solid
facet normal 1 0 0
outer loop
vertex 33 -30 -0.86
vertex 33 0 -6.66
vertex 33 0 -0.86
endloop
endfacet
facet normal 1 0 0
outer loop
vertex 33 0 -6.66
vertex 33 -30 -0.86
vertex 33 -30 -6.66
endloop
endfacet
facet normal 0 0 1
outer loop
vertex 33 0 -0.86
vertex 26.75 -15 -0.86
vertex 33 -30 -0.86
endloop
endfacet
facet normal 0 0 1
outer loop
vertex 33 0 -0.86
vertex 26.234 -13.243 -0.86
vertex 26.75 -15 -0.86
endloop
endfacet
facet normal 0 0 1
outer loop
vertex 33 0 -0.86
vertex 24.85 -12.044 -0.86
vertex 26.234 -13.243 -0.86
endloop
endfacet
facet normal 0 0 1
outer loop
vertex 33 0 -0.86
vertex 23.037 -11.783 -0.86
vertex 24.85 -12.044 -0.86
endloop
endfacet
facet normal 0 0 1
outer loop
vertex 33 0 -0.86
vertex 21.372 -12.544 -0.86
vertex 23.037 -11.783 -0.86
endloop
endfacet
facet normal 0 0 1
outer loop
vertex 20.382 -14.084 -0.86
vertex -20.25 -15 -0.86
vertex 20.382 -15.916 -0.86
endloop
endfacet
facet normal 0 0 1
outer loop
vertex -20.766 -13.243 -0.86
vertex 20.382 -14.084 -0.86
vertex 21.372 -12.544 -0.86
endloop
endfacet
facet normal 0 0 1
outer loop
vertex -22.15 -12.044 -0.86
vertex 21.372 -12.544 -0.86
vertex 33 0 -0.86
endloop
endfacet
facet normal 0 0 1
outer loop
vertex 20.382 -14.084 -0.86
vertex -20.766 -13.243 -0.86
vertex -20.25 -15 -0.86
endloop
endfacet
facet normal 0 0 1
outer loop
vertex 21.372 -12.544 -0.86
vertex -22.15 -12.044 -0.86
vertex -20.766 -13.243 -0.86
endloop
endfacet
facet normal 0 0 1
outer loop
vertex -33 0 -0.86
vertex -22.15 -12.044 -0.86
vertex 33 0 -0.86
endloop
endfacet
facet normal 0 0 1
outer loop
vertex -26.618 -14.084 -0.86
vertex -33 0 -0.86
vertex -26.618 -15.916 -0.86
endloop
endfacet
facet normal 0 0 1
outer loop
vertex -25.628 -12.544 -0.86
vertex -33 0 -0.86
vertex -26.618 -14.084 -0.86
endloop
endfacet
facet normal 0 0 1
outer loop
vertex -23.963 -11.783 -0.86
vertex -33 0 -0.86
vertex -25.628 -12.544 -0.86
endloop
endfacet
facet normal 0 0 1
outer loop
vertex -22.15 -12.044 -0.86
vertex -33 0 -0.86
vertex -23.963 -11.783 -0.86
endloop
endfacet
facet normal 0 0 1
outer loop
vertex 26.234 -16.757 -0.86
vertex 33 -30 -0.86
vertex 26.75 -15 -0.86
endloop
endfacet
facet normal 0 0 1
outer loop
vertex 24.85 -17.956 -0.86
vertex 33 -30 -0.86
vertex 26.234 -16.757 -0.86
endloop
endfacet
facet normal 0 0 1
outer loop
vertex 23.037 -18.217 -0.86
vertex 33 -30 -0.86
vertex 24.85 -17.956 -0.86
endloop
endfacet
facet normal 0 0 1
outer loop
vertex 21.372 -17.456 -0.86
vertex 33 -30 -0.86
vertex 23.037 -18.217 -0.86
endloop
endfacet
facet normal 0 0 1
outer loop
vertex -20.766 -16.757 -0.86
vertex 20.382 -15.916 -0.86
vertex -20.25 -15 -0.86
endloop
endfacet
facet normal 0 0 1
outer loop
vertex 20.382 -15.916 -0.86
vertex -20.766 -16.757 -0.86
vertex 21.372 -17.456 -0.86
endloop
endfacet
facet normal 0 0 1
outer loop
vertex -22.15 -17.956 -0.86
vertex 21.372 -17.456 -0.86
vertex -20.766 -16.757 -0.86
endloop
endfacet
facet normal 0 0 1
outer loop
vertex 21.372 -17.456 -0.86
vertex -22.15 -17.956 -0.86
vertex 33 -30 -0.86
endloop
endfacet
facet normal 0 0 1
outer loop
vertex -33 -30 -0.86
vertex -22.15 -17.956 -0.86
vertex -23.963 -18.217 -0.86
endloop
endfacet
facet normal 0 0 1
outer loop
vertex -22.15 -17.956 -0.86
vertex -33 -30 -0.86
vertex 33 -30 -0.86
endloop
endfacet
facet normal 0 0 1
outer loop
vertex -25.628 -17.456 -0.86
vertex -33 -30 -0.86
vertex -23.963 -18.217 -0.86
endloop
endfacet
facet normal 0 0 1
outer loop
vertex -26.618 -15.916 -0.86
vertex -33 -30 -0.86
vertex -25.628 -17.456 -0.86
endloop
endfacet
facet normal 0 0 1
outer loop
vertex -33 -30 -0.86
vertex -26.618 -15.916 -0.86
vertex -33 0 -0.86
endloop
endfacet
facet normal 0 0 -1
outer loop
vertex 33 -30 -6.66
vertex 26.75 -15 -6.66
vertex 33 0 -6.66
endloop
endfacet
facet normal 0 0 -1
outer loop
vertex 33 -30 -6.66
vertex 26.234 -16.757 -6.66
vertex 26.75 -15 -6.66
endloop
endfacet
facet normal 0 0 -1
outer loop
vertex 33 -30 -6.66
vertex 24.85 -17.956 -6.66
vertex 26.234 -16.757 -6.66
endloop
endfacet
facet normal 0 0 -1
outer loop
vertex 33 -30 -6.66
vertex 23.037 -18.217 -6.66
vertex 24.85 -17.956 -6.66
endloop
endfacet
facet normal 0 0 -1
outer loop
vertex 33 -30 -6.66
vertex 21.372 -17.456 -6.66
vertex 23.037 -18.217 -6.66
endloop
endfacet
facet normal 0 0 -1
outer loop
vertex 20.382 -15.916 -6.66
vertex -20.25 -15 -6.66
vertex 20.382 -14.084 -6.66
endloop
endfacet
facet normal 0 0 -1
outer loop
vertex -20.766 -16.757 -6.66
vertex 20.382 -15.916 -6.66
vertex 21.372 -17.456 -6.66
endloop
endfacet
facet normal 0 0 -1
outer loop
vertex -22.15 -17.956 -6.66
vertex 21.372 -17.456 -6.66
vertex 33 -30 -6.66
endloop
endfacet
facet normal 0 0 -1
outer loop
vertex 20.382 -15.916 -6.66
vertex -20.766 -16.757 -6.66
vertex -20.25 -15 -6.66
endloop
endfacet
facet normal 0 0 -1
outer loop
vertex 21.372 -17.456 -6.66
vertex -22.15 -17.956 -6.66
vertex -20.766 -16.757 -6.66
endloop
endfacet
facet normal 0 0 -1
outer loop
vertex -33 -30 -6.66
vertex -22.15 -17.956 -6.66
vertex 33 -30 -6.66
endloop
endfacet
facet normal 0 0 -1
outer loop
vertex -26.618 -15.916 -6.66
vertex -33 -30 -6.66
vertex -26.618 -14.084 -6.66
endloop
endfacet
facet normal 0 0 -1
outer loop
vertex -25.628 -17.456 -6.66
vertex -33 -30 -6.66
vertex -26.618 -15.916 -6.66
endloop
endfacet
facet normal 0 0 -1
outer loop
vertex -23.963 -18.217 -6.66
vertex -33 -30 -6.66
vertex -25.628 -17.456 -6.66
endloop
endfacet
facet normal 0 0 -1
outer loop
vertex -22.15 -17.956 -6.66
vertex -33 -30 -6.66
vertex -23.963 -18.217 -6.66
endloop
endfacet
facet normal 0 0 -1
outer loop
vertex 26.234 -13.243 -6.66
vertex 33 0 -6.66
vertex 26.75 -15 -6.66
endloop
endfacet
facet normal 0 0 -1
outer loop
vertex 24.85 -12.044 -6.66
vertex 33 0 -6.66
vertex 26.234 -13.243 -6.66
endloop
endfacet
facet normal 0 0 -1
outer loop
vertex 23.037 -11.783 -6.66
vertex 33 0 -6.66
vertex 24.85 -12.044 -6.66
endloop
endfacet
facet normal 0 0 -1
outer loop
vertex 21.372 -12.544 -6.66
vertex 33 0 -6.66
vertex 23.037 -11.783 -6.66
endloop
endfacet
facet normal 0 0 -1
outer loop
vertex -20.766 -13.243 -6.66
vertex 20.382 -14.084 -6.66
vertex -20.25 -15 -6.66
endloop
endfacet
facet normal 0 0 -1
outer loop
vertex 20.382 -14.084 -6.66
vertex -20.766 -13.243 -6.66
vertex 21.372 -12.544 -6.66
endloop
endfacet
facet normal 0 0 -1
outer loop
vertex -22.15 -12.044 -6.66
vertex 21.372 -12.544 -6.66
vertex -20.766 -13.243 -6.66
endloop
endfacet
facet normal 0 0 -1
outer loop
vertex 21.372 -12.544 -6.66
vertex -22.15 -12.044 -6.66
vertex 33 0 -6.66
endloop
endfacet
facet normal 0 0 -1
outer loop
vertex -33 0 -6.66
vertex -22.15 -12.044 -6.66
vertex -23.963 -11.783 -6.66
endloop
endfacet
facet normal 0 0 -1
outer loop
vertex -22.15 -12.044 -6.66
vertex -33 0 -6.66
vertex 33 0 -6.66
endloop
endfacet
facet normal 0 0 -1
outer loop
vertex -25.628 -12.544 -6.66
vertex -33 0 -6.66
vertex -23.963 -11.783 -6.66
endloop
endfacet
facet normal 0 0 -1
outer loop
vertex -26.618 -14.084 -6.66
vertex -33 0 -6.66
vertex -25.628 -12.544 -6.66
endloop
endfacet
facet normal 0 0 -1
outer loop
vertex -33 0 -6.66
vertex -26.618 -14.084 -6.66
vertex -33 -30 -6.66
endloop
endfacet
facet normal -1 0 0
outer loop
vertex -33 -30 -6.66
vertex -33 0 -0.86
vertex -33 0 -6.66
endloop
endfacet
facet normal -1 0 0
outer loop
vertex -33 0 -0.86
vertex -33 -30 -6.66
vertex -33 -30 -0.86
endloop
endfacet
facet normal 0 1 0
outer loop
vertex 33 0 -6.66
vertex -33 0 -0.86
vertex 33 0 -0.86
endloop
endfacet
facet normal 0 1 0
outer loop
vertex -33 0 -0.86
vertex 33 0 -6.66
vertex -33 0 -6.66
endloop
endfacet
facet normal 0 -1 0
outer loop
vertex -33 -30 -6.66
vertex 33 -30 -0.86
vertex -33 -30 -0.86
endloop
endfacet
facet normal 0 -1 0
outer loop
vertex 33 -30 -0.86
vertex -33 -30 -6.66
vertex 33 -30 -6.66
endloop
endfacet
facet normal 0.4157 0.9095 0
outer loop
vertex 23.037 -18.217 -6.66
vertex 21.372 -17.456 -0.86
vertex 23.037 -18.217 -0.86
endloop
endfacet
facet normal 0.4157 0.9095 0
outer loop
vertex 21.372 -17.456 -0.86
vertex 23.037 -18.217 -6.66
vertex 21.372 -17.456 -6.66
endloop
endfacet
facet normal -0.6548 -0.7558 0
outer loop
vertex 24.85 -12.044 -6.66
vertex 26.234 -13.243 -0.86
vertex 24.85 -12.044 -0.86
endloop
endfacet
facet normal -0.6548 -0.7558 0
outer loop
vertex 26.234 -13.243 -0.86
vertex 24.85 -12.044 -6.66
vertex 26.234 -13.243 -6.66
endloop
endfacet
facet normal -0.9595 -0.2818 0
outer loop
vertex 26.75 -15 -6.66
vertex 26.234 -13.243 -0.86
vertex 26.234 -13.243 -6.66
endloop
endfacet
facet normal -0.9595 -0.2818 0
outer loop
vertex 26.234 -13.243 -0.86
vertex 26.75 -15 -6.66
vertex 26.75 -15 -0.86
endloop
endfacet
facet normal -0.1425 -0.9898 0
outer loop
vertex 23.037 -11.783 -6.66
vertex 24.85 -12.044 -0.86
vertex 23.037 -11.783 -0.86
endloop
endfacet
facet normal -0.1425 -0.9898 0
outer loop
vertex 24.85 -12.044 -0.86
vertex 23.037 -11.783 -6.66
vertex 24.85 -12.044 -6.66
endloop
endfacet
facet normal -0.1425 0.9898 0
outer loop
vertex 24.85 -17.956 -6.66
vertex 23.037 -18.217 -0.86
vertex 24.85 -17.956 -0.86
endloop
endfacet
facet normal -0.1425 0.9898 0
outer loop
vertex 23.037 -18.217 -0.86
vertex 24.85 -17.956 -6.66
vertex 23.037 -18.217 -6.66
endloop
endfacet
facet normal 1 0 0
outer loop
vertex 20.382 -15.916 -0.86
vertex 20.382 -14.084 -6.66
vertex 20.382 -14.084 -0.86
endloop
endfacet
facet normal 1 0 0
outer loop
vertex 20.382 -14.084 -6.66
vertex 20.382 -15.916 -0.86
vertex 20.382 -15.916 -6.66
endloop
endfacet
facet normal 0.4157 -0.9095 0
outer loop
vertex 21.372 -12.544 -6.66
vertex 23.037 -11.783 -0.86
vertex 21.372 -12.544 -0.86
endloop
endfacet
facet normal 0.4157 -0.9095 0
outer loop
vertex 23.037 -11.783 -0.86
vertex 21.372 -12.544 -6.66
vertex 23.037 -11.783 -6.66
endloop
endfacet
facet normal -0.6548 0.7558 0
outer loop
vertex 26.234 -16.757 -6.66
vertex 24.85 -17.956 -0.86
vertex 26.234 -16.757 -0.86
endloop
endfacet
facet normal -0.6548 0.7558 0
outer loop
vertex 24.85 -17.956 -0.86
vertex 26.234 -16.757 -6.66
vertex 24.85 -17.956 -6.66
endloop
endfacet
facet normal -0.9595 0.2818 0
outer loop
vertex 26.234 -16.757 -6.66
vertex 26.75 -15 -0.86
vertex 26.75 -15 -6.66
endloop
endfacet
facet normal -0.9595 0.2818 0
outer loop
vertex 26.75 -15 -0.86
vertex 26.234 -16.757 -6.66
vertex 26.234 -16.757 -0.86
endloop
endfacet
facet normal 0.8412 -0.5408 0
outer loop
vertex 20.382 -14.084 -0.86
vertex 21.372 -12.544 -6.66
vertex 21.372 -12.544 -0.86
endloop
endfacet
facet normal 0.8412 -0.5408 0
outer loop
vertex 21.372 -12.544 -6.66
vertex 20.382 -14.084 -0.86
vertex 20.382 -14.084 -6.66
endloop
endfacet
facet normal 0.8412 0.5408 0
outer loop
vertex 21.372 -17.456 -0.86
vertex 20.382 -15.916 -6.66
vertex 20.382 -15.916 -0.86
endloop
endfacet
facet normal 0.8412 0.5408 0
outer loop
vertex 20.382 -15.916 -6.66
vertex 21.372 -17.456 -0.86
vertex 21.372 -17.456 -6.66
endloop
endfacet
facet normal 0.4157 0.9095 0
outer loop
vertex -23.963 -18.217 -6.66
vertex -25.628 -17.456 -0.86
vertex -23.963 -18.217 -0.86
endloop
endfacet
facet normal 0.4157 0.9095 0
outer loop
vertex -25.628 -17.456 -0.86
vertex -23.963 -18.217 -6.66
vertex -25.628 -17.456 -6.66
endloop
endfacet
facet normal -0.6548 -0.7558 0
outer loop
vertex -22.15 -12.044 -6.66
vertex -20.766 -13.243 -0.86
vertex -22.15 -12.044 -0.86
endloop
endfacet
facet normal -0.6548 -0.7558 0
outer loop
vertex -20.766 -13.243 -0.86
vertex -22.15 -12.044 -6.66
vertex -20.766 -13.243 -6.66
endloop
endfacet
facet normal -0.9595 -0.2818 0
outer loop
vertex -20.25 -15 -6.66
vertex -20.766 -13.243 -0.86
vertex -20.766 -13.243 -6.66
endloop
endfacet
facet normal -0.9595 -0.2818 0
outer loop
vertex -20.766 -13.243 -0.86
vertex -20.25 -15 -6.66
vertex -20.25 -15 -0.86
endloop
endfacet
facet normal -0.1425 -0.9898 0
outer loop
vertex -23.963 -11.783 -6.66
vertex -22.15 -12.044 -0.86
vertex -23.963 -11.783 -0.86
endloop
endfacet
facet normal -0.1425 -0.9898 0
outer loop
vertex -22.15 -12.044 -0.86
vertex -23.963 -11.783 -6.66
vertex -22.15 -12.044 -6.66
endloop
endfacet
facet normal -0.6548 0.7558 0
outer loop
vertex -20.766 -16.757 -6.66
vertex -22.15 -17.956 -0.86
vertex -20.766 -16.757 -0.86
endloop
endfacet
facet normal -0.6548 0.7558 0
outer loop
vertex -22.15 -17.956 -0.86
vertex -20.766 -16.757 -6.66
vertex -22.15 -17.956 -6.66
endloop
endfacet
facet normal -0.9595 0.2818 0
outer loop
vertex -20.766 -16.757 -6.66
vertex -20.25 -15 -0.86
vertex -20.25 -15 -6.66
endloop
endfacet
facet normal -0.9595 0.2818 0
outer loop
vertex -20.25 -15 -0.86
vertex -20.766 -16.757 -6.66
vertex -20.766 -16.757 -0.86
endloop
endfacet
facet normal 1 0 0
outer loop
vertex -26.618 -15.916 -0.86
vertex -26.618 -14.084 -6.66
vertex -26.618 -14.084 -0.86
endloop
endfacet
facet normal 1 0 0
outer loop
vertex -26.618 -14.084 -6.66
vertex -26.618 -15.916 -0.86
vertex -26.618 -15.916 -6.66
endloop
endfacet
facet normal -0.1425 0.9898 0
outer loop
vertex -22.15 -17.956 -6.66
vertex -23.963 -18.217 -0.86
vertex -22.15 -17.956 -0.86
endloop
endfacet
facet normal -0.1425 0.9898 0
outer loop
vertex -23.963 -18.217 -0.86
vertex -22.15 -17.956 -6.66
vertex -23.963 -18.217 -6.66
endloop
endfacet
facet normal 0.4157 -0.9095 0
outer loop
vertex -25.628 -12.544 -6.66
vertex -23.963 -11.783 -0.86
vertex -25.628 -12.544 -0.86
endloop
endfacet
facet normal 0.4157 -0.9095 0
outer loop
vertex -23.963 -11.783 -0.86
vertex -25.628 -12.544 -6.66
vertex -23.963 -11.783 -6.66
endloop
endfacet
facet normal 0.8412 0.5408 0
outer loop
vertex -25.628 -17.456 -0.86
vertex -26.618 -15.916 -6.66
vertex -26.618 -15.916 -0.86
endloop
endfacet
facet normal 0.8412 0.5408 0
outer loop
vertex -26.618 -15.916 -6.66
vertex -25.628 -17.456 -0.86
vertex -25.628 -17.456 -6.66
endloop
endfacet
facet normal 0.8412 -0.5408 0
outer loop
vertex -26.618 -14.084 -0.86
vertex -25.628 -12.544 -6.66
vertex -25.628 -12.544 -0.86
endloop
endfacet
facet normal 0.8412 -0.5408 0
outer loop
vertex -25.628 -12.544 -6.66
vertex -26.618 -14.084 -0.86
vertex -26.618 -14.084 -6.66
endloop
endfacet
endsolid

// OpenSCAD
tplate = 5.8;
recess = 6.66 - tplate;

ls1 = 24;                       // X distance between mounting screws
ls2 = 18;                       // Y distance between mounting screws

l1 = ls1 + 42;                  // plate X dimension
l2 = ls2 + 12;                  // plate Y dimension

dscrew = 4;                // mounting screw diameter
dscrew2 = 6.5;                  // 3030 mounting screw diameter

l3 = 17 + dscrew2;

bushplate();

module bushplate(){
    translate ([0,-l2/2,-tplate/2-recess]) difference ()
    {
        cube([l1,l2,tplate], center = true);
        // 3030 M6 screw holes
        translate ([+l3,0,0]) cylinder(d=dscrew2, h=100, center = true);
        translate ([-l3,0,0]) cylinder(d=dscrew2, h=100, center = true);
    }
}
